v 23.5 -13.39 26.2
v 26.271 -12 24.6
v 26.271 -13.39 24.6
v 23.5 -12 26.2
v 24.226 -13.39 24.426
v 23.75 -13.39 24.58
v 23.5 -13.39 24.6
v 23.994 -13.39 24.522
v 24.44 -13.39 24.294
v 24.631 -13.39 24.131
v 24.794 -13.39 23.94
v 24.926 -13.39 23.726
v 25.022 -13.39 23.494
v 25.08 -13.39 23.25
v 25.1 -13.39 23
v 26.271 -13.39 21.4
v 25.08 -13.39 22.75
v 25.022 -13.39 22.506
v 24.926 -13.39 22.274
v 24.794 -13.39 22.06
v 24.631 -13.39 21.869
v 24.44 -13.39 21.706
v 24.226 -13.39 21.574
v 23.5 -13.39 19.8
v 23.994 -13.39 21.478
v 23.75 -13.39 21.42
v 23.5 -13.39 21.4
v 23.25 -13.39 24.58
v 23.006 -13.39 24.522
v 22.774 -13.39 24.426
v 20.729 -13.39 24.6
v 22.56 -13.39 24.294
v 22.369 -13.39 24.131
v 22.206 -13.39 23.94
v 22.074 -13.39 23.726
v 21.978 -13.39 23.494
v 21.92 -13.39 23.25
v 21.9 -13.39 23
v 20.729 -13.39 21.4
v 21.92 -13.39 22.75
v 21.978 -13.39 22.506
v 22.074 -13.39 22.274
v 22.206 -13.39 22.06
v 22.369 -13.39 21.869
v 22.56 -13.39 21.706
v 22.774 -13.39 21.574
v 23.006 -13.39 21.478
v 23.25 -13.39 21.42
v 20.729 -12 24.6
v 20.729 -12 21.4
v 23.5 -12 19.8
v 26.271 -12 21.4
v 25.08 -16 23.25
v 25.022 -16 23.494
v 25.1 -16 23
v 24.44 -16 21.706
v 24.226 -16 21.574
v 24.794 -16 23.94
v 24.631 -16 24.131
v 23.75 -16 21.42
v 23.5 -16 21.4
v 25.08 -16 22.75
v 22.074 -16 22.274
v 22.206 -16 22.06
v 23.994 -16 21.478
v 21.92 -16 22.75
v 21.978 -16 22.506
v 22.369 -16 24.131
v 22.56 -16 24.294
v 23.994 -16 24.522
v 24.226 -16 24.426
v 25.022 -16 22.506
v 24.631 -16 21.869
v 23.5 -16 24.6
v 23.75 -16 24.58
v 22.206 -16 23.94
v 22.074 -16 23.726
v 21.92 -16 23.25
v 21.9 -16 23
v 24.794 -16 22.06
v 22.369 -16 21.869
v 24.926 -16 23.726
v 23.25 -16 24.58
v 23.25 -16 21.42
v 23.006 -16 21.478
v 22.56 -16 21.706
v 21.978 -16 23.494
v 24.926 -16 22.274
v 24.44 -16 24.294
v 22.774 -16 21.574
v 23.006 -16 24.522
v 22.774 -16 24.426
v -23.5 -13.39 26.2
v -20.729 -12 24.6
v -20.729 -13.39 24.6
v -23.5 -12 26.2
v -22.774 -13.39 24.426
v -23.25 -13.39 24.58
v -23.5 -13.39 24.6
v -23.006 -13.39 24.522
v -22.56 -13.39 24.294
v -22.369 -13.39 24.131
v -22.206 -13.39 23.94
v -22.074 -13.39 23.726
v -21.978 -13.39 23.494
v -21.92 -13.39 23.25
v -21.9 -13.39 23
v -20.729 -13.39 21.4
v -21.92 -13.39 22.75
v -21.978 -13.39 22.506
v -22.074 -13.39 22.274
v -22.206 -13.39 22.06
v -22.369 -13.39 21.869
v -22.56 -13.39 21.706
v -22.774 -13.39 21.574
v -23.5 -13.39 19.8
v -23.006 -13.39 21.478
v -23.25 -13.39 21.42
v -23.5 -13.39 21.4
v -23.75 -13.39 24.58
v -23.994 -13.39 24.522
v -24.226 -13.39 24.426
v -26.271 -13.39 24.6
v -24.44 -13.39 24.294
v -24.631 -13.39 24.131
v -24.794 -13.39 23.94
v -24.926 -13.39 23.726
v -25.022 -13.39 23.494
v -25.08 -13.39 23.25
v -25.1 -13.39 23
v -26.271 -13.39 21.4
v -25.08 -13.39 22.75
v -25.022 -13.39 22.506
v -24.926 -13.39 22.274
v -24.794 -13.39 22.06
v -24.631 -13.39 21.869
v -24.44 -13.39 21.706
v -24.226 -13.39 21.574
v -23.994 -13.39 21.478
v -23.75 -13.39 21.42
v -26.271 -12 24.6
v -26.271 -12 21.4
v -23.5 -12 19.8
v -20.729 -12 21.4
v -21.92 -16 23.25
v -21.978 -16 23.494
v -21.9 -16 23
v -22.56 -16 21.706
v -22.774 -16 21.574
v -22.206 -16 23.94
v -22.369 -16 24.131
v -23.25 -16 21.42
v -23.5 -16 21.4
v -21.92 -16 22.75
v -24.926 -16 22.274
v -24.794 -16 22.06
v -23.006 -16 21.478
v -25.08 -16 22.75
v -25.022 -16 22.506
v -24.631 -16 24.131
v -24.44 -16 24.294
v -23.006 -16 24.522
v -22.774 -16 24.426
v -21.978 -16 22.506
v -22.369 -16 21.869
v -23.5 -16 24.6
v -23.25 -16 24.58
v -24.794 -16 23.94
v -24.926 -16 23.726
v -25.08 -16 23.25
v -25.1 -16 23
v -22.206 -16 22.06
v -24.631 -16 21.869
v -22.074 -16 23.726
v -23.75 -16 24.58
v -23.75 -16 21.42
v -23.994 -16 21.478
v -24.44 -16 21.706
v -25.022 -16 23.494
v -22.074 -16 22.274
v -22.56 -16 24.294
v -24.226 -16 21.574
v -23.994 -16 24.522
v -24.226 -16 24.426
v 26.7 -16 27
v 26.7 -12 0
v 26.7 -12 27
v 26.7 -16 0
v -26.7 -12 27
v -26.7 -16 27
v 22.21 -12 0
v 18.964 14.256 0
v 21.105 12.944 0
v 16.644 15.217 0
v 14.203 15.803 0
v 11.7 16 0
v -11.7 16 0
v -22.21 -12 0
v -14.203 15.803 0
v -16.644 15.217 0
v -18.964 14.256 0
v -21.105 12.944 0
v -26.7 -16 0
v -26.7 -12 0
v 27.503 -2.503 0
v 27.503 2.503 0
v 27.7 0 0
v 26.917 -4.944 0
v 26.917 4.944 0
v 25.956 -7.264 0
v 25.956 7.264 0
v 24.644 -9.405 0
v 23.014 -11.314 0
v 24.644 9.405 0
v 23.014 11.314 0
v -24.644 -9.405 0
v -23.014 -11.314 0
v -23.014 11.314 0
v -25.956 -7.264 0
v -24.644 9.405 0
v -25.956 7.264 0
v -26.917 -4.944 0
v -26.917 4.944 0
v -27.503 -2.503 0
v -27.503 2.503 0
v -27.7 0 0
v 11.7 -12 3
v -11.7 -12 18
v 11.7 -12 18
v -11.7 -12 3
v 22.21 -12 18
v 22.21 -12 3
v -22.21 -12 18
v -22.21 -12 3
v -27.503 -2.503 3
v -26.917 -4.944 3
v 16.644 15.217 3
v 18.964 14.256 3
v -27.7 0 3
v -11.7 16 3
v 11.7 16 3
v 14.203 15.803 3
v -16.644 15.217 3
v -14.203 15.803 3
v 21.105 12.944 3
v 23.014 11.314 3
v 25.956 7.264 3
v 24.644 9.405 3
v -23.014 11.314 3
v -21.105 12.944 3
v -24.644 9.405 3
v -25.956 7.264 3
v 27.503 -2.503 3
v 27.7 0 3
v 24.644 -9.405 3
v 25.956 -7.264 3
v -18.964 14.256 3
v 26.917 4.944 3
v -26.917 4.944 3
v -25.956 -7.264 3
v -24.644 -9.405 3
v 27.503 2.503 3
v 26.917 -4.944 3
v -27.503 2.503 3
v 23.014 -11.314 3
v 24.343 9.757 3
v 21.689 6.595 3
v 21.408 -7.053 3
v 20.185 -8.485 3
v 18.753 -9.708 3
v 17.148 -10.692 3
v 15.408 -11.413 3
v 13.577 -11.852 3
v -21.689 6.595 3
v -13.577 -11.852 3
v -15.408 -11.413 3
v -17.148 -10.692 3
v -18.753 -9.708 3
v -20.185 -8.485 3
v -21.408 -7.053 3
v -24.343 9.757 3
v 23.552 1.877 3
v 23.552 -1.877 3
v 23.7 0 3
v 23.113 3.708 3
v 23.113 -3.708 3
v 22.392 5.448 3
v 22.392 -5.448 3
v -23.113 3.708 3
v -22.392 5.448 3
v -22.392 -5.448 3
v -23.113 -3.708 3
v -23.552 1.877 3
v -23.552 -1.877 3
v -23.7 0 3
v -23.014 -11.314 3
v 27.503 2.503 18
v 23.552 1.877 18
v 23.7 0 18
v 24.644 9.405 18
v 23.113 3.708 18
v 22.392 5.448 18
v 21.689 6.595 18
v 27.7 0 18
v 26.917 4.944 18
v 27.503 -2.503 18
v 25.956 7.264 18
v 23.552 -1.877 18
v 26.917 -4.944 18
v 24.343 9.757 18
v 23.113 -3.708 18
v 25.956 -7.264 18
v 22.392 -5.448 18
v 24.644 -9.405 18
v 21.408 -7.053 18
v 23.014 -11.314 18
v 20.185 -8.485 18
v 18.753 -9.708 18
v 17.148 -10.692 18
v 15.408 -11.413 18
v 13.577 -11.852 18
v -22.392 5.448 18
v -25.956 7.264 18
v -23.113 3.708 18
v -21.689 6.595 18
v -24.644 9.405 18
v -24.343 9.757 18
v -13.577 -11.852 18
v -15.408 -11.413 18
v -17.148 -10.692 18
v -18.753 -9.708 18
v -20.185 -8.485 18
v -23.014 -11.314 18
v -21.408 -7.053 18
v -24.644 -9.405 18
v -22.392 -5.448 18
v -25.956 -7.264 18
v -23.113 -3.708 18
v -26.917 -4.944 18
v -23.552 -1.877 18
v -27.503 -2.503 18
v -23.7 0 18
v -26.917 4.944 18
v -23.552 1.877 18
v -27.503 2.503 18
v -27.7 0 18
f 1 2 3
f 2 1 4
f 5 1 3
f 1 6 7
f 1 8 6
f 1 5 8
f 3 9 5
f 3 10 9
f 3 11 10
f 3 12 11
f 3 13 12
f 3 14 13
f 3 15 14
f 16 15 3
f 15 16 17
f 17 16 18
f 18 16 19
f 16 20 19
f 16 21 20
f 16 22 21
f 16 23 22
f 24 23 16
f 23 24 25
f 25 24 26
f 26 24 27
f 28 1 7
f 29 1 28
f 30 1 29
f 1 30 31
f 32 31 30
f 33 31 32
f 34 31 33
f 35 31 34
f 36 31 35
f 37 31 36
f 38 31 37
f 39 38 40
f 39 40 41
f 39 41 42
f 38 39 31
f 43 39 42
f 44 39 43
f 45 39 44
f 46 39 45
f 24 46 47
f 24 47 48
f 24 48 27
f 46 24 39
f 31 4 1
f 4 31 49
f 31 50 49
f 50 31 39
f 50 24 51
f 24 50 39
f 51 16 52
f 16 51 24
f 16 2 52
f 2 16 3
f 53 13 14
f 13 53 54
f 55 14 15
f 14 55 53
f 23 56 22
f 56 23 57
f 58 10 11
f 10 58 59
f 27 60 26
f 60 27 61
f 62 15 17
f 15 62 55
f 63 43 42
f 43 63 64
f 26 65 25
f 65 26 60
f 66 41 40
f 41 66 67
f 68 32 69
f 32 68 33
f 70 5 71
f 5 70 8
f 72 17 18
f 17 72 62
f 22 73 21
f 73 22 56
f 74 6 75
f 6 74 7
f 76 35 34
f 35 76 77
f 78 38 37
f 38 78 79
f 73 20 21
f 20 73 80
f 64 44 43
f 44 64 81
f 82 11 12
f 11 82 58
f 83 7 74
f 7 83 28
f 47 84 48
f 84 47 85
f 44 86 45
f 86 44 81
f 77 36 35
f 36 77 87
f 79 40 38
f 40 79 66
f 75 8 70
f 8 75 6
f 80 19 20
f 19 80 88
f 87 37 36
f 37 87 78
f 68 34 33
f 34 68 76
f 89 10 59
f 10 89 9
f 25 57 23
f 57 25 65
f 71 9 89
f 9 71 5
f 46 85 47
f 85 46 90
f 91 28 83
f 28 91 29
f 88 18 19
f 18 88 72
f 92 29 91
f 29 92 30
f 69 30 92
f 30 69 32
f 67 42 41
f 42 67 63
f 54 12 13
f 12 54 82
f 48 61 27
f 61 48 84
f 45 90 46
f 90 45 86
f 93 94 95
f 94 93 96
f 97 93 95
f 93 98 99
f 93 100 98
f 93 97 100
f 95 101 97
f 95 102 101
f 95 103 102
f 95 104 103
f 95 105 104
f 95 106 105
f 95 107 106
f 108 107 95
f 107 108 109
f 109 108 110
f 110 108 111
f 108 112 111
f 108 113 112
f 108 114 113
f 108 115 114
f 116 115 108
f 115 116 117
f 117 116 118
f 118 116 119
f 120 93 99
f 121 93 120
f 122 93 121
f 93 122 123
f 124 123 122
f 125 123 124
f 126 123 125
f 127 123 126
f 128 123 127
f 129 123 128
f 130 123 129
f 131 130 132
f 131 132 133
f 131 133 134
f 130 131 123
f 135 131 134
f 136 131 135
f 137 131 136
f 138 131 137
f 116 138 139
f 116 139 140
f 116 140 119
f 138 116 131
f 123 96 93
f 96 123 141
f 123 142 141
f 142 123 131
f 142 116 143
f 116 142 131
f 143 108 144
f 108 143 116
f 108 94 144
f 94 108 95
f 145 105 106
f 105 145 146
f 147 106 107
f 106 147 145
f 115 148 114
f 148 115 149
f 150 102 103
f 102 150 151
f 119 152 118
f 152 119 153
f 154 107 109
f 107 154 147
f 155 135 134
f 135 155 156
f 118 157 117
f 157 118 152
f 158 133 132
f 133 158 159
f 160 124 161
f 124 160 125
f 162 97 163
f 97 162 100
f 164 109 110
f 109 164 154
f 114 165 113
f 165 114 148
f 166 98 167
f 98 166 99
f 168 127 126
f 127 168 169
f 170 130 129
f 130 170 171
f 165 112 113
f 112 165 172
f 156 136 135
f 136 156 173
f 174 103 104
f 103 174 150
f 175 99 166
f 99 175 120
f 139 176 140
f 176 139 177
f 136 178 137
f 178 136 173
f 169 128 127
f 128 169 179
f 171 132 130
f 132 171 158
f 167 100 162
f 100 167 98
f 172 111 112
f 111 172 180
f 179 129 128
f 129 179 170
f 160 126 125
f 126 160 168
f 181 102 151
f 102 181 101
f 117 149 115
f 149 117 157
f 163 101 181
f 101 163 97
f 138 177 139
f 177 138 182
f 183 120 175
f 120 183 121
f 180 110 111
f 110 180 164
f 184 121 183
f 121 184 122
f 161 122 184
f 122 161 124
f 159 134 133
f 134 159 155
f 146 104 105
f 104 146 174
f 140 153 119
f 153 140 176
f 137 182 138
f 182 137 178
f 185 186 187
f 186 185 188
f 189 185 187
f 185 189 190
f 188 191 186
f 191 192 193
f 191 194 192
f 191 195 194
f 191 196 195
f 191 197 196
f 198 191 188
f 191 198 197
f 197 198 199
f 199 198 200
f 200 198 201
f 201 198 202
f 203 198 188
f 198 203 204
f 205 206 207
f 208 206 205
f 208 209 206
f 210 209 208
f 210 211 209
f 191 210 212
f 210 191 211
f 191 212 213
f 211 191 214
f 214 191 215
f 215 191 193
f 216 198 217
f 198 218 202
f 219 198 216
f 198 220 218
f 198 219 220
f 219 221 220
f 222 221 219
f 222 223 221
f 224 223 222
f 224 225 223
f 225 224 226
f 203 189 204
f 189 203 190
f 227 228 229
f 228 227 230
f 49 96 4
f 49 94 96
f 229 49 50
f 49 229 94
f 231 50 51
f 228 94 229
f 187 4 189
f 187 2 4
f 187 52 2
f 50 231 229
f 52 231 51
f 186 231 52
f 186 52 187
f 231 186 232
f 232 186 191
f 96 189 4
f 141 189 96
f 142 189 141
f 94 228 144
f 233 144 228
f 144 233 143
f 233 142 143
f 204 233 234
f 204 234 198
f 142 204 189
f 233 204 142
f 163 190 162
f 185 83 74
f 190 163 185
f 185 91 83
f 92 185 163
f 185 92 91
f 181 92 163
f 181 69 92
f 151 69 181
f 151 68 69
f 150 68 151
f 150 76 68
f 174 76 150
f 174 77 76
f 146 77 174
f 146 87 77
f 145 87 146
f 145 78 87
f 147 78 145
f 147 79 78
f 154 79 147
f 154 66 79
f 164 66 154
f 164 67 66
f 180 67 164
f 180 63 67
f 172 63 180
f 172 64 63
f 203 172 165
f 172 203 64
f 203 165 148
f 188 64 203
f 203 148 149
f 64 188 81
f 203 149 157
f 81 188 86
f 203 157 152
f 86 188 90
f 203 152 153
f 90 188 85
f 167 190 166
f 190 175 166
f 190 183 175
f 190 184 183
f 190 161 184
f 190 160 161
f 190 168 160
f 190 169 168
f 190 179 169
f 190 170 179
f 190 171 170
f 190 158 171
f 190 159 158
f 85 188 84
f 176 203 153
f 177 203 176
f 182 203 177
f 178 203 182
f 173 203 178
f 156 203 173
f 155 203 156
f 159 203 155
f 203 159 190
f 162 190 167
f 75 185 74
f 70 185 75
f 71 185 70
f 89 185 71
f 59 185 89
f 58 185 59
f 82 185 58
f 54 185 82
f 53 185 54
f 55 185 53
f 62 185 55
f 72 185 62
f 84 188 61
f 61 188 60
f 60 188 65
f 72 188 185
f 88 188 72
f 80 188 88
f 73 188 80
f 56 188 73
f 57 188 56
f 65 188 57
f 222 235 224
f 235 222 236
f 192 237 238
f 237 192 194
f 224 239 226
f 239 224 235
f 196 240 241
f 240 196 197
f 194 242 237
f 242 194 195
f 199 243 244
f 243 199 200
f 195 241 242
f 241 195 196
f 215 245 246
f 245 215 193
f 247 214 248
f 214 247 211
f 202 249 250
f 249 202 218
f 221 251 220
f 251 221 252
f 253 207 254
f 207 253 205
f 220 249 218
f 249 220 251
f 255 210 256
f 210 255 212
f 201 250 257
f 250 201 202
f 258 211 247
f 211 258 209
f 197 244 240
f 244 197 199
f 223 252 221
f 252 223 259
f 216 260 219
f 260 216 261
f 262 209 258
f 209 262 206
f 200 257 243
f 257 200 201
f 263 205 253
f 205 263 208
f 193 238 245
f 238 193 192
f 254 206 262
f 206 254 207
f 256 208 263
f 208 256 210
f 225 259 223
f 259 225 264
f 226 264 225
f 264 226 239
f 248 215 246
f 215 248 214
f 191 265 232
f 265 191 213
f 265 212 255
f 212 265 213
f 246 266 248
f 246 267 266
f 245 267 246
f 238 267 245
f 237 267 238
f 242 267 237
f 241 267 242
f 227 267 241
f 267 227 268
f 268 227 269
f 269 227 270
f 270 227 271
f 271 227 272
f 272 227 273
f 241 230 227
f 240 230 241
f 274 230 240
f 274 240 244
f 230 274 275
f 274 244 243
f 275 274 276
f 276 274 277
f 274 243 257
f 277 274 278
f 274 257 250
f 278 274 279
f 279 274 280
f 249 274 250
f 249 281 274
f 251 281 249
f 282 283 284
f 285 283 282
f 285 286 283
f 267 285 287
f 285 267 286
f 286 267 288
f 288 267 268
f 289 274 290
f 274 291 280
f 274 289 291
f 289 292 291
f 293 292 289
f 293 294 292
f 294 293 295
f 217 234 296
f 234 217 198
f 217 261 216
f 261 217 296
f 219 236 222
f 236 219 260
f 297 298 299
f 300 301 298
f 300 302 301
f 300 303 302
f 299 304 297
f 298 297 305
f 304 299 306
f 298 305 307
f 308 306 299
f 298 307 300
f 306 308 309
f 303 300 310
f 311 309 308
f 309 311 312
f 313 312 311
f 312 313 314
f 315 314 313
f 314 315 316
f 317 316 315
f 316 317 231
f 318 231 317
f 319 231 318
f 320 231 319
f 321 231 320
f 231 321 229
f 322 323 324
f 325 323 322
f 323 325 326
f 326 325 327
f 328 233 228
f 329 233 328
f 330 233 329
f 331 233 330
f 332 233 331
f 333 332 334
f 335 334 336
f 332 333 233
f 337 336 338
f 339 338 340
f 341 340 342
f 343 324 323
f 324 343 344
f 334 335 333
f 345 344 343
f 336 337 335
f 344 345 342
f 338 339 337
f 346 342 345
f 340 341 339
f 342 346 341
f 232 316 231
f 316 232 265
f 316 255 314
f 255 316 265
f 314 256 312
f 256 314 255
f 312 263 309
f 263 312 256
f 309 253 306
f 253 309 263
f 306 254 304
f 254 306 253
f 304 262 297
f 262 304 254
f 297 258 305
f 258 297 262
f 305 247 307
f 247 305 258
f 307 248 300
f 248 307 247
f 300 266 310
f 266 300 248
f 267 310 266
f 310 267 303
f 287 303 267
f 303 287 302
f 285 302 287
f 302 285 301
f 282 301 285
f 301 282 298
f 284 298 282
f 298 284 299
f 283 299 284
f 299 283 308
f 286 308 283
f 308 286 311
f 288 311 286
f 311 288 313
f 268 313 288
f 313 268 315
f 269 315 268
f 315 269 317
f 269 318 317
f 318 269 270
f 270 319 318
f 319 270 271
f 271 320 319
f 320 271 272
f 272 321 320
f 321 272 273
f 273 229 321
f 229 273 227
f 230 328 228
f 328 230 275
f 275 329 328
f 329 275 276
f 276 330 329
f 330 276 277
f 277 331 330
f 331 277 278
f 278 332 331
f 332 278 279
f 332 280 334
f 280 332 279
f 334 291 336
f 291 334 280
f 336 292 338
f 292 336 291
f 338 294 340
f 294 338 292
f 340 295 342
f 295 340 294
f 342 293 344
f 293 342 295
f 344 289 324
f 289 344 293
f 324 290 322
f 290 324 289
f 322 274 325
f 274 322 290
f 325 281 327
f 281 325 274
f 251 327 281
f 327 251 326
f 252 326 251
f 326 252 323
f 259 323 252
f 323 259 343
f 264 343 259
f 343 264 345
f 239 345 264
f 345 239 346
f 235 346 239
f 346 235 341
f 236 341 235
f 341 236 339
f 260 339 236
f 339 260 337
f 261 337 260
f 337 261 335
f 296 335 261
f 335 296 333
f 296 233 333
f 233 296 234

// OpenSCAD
$fn = 40;
size = 11.7;

module outerShape() {
	hull() {
		translate([-size, 0]) circle(d=32);
		translate([size, 0]) circle(d=32);
	}
}

module innerShape() {
	hull() {
		translate([-size, 0]) circle(d=24);
		translate([size, 0]) circle(d=24);
	}
}

module screwHole() {
	a = 3.2;
	translate([0, 0, -0.01]) linear_extrude(height=0.4*6) {
		polygon(points=[
			[0, a],
			[sin(60)*a, cos(60)*a],
			[sin(120)*a, cos(120)*a],
			[0, -a],
			[sin(-120)*a, cos(-120)*a],
			[sin(-60)*a, cos(-60)*a],
		]);
	}
	cylinder(d = 3.2, h = 1.01*6);
}

module clipIn() {
	difference() {
		outerShape();
		innerShape();
		translate([10, 16]) rotate([0, 0, 50]) square(30, center=true);
		translate([-10, 16]) rotate([0, 0, -50]) square(30, center=true);
	}
}

module screwHolder(length) {
	difference() {
		translate([-53.4/2, -16, 8 - length]) cube([53.4, 4, length]);
		translate([23.5, -11, 4]) rotate([90, 0, 0]) screwHole();
		translate([-23.5, -11, 4]) rotate([90, 0, 0]) screwHole();
	}
}

module battery1() {
	difference() {
		linear_extrude(height=3) {
			difference() {
				outerShape();
				translate([0, 13]) square([15, 32], center=true);
			}
		}
		translate([0, 1.5, 1.7]) hull() {
			translate([-11, 0, 0]) cylinder(d=12, h=2);
			translate([11, 0, 0]) cylinder(d=12, h=2);
		}
	}

	translate([0, 0, 3]) linear_extrude(height=10) clipIn();
	translate([0, 0, 13]) screwHolder(21);
}

module battery2() {
	linear_extrude(height=3) outerShape();

	translate([0, 0, 3]) linear_extrude(height=15) clipIn();
	translate([0, 0, 19]) screwHolder(27);
}

//battery1();
battery2();
